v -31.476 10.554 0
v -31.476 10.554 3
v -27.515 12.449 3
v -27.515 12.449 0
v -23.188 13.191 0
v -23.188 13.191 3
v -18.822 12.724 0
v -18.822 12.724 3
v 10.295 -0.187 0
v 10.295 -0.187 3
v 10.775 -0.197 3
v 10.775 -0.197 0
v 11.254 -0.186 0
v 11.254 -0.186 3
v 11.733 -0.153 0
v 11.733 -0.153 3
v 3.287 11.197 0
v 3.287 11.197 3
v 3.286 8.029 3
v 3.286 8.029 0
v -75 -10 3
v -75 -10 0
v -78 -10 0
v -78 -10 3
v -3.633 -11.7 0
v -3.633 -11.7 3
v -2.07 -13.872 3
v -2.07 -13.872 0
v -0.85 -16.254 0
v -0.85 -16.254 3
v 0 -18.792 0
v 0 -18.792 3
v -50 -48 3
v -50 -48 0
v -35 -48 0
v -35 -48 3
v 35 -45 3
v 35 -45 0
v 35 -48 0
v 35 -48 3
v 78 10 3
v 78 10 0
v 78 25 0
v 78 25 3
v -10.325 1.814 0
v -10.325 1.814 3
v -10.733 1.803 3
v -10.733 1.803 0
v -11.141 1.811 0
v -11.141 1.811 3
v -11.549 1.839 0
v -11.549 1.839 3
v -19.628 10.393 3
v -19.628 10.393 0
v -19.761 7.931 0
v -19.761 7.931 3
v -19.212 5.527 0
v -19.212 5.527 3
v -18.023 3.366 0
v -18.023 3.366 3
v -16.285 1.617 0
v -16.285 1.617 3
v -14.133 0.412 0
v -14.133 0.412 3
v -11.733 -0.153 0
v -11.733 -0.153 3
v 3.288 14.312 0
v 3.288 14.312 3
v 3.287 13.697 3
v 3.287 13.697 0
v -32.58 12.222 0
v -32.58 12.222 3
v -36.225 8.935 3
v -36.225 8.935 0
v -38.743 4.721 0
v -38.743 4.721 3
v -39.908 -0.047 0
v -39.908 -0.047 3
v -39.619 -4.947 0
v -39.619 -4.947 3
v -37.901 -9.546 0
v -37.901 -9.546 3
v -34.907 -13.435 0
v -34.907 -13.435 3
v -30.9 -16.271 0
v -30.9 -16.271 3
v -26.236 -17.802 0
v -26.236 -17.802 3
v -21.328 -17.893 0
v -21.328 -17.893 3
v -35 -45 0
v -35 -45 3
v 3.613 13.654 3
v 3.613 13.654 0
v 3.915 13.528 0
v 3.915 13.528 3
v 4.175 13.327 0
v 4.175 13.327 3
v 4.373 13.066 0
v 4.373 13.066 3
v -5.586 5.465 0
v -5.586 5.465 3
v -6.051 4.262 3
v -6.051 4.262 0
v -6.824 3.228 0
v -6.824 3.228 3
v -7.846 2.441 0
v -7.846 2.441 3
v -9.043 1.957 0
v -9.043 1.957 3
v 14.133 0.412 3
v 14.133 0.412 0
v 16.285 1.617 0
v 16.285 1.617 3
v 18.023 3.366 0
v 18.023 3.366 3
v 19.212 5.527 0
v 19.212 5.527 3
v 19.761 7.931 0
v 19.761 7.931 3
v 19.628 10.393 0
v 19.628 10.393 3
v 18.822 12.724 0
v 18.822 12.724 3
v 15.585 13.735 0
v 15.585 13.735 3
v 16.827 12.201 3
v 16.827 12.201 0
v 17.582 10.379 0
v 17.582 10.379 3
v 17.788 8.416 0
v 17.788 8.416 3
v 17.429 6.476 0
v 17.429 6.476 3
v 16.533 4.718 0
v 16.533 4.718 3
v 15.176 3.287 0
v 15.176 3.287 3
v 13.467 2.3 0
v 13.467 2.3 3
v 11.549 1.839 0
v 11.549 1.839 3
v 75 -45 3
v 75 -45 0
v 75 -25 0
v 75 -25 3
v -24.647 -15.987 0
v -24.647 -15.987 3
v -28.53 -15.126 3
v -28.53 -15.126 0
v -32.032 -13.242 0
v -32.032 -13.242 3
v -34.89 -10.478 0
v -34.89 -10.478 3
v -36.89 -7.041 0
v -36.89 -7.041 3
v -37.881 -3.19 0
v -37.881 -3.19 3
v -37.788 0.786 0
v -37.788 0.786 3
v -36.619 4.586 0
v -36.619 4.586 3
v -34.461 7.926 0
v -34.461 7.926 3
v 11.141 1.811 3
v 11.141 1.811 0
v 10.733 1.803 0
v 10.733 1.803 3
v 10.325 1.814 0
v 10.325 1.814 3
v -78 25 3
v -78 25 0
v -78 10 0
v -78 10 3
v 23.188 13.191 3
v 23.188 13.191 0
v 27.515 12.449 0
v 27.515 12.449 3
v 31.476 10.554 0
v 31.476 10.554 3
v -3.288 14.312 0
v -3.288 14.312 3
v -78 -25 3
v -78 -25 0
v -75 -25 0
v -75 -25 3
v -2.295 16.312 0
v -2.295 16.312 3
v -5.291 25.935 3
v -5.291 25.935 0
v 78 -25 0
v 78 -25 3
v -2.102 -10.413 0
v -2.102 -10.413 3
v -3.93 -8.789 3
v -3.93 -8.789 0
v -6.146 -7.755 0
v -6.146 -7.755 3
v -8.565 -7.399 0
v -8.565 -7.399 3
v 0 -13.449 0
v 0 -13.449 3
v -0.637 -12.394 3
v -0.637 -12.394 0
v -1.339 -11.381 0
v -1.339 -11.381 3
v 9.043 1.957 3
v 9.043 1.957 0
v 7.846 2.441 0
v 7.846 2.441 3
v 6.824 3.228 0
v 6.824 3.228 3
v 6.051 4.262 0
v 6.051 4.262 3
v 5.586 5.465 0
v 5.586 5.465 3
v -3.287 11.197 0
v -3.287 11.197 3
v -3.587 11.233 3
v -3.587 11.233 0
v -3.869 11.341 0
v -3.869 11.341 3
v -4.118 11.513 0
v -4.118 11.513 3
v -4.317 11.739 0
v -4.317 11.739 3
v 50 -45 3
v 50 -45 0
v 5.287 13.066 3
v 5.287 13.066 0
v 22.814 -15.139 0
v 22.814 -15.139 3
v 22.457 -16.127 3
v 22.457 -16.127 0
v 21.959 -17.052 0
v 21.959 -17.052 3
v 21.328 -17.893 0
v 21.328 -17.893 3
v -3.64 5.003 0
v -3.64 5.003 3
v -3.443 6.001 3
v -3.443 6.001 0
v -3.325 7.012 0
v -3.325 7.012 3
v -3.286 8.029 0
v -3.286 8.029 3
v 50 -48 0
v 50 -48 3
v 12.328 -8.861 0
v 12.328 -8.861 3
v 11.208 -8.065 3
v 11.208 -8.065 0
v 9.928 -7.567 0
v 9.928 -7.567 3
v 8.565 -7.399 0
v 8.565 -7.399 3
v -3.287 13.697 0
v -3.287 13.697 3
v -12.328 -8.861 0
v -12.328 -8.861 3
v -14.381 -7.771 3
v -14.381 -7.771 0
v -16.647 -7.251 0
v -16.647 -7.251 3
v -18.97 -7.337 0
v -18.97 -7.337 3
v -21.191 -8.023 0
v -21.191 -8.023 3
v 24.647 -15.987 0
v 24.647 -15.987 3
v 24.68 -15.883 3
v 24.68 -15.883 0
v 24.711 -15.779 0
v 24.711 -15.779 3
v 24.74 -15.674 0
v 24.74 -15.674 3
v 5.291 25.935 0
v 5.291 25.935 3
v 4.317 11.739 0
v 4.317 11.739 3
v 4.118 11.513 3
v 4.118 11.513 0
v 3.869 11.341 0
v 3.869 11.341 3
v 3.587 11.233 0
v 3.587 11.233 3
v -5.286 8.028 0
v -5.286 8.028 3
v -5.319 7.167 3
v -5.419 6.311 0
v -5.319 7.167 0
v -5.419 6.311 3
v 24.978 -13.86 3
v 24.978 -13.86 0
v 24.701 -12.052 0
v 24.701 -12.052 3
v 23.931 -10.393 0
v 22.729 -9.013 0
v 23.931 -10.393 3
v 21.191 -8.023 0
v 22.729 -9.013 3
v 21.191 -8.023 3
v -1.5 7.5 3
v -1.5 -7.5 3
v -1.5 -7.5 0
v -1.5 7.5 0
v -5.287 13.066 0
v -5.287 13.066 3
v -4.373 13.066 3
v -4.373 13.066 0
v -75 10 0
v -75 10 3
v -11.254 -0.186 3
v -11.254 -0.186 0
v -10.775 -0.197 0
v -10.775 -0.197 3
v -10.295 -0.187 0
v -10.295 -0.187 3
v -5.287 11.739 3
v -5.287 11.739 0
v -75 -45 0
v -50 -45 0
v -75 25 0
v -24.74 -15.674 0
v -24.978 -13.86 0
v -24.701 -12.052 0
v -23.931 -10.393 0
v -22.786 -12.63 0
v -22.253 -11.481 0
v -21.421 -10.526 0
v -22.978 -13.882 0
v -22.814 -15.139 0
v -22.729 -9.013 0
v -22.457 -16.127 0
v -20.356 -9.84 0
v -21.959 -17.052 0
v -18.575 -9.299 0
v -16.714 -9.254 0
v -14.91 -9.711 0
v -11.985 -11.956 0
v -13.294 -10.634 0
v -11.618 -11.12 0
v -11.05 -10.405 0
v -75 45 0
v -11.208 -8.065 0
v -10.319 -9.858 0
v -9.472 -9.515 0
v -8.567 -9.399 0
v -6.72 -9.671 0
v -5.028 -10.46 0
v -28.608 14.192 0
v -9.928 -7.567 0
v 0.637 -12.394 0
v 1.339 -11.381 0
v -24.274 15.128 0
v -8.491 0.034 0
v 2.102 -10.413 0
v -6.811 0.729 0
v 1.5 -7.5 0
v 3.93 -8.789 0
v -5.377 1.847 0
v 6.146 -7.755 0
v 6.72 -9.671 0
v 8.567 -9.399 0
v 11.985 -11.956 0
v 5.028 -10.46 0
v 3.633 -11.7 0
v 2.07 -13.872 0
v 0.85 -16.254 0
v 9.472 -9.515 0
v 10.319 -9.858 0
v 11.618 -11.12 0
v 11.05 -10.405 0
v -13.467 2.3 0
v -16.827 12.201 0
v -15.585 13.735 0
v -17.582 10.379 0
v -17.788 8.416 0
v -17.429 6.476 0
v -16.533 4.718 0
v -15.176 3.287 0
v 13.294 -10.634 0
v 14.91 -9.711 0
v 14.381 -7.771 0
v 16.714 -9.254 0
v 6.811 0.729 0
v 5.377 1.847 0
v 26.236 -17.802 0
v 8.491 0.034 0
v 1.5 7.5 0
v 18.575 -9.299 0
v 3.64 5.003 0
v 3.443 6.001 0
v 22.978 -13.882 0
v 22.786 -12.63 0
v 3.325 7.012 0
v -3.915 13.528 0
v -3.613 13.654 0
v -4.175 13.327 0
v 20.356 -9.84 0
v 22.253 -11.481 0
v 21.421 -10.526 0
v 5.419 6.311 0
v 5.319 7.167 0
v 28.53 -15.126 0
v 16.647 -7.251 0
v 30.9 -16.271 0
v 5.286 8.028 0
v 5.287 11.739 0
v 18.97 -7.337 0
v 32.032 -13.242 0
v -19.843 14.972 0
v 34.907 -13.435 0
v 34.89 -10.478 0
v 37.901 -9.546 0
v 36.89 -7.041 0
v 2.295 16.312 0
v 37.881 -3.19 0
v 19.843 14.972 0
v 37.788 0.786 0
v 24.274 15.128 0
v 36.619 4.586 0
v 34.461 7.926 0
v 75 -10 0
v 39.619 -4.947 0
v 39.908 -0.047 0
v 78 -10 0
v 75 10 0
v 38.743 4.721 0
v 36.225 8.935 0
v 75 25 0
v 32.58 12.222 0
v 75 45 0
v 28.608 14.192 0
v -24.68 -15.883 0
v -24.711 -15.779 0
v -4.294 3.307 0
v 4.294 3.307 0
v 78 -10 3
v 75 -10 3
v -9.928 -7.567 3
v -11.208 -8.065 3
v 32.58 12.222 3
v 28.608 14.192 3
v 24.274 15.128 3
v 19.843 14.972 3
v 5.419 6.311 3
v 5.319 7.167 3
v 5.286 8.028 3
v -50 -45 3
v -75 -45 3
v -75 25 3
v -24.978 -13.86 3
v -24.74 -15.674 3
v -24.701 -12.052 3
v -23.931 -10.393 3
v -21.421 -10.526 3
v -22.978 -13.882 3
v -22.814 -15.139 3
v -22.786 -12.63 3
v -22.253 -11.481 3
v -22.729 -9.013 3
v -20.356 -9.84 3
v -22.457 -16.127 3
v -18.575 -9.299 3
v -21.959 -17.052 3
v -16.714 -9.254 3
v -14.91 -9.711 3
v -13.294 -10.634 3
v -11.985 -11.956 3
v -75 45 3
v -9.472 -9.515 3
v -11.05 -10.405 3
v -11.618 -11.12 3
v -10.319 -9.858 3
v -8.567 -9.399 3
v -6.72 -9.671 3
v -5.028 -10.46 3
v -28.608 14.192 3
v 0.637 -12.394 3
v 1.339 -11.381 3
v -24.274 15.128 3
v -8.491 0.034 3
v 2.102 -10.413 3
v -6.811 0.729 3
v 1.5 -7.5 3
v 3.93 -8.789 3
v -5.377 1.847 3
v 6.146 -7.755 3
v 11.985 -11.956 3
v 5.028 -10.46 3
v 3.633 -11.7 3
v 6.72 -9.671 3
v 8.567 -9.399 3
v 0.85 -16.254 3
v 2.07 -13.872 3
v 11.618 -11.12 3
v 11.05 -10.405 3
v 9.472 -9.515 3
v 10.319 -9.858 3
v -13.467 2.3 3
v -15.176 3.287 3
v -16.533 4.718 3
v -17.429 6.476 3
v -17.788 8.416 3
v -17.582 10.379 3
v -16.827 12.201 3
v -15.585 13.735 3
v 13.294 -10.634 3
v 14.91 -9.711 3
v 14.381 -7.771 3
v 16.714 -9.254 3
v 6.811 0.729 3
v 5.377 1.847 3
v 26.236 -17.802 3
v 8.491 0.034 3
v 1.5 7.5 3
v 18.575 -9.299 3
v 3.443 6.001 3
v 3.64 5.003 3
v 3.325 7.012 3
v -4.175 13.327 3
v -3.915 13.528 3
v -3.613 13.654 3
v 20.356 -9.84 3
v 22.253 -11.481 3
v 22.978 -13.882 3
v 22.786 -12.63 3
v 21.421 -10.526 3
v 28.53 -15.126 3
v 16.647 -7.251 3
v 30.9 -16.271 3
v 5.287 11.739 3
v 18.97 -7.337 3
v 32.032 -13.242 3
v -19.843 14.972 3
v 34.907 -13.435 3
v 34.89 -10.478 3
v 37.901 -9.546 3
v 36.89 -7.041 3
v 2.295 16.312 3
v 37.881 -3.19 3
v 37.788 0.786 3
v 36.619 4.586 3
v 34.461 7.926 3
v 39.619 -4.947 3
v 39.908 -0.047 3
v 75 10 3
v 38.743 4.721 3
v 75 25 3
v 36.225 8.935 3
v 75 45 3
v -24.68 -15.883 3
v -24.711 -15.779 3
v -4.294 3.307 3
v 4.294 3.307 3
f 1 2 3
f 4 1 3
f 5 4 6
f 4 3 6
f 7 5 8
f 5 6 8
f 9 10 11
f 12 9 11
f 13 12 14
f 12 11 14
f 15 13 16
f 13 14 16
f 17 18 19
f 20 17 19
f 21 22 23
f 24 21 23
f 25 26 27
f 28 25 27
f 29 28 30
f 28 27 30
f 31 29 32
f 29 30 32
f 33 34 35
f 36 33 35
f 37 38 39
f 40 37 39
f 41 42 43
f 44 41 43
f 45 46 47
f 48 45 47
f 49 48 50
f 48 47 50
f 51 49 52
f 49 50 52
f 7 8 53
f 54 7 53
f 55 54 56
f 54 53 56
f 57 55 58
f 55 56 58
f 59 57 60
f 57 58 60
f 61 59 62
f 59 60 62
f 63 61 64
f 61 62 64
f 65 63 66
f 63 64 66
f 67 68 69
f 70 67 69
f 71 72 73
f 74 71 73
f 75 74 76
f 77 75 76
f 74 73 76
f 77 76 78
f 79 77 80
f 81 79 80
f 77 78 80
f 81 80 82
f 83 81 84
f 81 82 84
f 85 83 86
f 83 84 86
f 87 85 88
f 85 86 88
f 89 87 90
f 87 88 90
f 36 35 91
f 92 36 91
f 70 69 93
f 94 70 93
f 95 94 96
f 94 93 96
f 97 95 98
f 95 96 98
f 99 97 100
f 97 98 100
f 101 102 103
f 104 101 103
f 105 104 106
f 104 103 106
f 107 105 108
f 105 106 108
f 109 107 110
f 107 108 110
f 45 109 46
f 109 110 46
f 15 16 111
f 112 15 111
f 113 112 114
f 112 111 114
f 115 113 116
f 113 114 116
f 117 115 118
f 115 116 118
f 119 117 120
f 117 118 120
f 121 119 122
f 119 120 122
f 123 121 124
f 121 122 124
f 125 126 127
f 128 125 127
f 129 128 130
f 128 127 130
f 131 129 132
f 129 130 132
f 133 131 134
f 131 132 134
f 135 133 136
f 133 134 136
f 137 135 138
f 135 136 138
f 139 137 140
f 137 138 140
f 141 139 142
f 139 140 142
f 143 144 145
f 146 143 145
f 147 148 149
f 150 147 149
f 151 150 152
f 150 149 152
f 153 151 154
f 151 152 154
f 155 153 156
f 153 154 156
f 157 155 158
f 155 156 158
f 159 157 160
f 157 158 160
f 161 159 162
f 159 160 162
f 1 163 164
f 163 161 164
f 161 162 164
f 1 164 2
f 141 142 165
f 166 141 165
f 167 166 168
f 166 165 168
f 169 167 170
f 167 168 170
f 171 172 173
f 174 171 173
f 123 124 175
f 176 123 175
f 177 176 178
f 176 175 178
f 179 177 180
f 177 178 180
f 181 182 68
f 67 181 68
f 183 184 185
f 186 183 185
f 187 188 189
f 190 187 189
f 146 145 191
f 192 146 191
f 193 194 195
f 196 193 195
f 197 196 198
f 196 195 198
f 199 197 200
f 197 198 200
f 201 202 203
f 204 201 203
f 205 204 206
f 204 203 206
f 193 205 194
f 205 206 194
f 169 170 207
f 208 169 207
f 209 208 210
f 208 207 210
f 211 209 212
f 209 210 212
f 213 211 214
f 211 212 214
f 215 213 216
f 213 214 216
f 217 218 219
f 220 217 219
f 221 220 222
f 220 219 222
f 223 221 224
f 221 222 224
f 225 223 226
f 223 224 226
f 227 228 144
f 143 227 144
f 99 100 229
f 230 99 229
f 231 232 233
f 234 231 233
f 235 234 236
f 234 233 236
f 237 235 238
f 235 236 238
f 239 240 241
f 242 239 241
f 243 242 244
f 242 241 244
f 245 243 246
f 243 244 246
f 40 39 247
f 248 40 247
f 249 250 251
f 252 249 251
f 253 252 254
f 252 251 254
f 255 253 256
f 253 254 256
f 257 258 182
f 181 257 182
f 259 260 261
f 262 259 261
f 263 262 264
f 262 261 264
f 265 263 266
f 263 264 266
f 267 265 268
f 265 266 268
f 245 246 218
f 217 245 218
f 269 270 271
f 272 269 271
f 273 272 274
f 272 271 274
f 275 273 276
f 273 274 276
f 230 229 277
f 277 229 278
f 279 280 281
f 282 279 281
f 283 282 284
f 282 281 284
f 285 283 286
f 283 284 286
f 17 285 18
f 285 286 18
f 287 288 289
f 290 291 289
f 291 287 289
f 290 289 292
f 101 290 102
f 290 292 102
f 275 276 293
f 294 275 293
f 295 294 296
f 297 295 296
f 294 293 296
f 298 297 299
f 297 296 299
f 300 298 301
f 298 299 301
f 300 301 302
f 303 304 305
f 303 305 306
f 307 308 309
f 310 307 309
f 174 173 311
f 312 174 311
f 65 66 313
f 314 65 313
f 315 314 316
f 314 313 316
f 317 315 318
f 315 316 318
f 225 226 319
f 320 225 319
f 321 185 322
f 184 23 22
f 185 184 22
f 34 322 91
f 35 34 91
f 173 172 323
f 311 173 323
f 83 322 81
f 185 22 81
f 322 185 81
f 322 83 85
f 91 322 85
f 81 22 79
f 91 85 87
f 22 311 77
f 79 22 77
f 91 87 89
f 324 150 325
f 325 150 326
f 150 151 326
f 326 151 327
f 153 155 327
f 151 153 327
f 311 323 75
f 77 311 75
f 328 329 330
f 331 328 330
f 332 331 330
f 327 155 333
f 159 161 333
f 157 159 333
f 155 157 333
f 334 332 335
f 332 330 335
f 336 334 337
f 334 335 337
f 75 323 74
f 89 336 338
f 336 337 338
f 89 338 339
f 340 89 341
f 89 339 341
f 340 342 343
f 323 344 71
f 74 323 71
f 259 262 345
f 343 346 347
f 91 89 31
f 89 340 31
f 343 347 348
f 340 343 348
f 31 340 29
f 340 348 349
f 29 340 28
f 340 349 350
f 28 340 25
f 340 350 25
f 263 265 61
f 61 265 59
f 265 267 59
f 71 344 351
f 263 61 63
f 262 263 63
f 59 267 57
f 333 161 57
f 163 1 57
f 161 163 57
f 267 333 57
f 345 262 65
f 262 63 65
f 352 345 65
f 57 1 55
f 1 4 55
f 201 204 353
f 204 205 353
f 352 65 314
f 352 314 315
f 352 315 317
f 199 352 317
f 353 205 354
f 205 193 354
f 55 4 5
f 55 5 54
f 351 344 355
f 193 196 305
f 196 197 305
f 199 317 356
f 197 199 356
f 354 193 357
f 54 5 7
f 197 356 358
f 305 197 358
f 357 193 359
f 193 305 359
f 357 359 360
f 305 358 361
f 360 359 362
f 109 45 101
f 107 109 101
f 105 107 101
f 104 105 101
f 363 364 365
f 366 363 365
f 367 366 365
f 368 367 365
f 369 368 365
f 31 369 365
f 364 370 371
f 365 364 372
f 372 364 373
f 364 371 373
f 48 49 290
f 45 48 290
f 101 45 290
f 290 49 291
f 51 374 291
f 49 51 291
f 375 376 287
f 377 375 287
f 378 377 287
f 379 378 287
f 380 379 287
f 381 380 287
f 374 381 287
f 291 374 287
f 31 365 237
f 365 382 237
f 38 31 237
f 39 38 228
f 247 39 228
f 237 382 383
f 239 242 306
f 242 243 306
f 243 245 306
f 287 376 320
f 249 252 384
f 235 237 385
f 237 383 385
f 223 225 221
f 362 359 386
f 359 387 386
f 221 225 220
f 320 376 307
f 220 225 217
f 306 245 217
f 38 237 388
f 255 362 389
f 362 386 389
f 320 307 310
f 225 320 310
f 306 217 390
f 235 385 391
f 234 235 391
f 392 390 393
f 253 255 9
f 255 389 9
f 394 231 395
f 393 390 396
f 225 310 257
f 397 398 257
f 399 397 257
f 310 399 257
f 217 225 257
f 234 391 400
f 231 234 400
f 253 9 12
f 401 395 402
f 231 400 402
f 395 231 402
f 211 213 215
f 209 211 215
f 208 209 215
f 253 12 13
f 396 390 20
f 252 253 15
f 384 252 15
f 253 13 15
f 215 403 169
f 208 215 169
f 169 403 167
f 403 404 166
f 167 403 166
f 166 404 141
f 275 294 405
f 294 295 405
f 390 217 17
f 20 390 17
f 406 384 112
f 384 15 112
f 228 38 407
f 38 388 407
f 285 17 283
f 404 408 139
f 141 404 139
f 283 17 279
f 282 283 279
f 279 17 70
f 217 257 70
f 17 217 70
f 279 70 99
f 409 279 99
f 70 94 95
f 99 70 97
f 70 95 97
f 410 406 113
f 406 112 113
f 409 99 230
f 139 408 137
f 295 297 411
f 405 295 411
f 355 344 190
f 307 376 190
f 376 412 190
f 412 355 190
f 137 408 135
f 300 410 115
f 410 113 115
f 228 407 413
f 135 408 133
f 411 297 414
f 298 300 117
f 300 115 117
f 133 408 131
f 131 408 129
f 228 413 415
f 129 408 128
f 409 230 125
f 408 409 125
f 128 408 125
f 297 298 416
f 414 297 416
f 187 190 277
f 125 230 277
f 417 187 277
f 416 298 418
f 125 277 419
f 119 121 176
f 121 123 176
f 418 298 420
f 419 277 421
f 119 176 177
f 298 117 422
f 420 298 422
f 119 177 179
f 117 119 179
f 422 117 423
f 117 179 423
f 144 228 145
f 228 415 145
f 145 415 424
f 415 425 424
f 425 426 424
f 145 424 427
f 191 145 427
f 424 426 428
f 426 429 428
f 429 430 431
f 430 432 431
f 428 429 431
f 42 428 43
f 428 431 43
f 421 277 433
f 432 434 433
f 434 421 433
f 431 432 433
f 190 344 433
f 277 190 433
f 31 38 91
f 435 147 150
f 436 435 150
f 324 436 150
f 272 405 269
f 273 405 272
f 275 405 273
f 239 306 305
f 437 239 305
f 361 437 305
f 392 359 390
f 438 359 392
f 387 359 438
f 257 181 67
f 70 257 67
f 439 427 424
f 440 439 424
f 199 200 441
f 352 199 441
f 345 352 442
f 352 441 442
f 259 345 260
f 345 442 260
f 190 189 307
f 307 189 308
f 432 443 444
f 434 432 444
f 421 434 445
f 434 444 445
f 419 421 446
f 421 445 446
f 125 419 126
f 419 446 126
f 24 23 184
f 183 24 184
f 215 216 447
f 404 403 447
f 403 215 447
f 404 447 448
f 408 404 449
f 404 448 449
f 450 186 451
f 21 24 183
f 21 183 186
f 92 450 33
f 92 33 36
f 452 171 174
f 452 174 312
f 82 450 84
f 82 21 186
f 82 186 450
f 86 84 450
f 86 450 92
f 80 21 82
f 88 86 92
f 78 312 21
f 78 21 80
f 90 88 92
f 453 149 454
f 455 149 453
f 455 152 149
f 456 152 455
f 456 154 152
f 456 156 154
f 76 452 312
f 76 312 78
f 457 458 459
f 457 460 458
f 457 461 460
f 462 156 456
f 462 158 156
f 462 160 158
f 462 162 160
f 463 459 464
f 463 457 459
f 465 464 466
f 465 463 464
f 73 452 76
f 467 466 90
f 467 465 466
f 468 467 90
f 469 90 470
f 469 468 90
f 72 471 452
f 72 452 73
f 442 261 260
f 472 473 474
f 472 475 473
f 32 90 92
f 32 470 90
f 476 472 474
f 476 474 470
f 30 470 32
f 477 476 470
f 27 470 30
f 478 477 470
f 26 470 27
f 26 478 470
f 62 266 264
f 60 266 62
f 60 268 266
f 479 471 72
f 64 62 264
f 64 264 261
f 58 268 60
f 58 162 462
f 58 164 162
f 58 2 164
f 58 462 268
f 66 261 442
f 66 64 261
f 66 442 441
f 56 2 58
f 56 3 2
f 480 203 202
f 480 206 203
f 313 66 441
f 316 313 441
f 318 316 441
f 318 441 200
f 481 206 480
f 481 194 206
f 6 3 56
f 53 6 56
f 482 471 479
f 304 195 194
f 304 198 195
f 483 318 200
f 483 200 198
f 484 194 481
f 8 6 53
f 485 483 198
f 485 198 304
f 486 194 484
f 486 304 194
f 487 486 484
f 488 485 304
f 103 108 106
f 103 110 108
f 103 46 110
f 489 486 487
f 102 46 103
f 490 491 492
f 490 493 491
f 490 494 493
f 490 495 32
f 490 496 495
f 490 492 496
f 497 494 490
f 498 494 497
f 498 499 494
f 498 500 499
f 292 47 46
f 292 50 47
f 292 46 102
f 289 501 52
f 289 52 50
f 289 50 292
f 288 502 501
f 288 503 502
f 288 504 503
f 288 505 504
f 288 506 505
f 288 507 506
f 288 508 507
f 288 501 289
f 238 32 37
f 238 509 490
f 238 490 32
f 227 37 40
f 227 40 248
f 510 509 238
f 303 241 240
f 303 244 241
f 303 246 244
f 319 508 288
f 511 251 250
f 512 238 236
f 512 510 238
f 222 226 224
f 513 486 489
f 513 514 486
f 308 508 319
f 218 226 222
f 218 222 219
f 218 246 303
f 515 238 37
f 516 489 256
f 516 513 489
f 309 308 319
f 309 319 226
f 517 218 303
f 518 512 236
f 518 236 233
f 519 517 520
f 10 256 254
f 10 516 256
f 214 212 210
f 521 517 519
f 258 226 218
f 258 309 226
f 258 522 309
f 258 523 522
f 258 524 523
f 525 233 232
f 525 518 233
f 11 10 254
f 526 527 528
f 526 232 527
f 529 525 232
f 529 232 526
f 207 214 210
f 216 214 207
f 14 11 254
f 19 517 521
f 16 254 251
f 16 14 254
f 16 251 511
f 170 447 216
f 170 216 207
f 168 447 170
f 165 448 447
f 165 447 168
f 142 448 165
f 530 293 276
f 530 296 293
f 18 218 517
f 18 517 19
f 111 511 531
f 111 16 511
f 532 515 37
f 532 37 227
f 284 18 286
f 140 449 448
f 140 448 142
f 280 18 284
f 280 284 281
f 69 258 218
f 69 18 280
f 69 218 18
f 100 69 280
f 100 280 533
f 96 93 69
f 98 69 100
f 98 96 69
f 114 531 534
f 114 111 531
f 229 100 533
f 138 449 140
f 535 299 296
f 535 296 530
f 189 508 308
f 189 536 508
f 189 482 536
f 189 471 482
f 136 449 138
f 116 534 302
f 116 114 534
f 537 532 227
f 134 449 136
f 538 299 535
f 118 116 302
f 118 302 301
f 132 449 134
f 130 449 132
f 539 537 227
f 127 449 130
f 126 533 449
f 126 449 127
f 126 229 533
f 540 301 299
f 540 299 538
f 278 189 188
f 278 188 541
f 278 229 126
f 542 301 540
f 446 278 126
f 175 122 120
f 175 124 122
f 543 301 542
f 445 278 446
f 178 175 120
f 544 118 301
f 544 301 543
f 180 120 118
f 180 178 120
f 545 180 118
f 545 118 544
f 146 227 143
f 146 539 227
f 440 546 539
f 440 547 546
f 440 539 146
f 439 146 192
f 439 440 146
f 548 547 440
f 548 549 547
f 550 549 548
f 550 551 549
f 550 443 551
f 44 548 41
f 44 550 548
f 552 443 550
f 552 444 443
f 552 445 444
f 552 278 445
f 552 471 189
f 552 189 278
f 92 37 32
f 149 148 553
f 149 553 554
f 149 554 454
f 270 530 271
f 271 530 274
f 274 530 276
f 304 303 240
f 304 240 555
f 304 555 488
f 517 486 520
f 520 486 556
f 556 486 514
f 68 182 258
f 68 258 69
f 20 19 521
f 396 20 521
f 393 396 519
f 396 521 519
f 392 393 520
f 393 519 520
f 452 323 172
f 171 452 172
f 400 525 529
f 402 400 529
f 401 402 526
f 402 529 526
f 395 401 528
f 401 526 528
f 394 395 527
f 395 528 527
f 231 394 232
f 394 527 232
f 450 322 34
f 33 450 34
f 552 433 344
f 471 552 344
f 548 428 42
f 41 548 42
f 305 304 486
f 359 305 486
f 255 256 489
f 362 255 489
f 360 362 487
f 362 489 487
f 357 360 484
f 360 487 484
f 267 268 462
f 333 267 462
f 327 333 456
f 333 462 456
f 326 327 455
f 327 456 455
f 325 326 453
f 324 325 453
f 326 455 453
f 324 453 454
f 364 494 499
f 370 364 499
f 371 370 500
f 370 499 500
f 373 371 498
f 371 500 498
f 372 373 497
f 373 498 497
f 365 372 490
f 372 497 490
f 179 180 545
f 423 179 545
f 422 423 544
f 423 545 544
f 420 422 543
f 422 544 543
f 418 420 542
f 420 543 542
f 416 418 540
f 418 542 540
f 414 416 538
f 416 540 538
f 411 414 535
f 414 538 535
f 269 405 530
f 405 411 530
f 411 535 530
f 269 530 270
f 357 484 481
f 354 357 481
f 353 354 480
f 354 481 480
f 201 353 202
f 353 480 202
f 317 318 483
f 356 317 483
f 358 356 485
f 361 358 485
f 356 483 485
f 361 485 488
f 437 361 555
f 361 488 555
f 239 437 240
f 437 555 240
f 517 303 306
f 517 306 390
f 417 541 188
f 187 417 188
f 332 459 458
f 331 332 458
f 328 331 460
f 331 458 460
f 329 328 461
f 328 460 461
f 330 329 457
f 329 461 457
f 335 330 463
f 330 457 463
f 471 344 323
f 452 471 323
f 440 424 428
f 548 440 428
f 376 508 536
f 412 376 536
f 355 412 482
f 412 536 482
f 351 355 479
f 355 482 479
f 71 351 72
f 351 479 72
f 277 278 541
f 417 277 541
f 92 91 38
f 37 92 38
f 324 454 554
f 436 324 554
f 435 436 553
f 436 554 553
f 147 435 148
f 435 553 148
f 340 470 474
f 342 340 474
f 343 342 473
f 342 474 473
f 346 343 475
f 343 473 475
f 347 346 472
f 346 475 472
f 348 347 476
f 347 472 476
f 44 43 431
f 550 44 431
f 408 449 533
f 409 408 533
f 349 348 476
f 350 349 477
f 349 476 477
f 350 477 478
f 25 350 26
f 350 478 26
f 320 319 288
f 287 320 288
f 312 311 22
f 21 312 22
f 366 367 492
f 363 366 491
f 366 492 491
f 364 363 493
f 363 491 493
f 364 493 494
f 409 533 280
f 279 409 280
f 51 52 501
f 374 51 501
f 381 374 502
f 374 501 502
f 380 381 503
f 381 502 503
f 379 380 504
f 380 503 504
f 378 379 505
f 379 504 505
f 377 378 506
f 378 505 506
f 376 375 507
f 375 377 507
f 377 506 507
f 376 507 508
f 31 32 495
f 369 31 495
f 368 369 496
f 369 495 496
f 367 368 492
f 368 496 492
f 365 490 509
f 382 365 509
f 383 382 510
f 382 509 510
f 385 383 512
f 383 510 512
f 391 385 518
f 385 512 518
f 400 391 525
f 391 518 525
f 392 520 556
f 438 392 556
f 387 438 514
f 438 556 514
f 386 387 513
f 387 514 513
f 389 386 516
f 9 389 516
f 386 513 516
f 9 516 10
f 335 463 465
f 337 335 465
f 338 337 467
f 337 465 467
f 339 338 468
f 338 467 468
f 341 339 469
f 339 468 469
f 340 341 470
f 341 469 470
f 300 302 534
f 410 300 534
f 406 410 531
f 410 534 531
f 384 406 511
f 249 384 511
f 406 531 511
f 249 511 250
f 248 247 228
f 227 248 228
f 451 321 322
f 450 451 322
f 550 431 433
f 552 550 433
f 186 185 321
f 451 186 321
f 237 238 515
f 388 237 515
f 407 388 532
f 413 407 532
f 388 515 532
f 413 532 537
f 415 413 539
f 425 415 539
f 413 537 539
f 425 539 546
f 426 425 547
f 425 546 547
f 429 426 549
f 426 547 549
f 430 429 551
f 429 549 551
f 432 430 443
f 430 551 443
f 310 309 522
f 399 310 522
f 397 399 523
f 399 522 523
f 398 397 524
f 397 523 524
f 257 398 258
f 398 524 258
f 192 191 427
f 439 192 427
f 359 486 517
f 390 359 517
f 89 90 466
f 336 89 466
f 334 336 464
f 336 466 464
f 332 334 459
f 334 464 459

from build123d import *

# Parameters (mm, degrees)
BOSS_EXTRUDE1_DEPTH = 3
SKETCH2_W           = 3
SKETCH2_H           = 15
CUT_EXTRUDE1_DEPTH  = 10
CUT_EXTRUDE5_DEPTH  = 10


with BuildPart() as part:
    # Sketch1 → Boss-Extrude1 (new body)
    with BuildSketch(Plane.XY):
        Polygon((75, 45), (-75, 45), (-75, 25), (-78, 25), (-78, 10), (-75, 10), (-75, -10), (-78, -10), (-78, -25), (-75, -25), (-75, -45), (-50, -45), (-50, -48), (-35, -48), (-35, -45), (35, -45), (35, -48), (50, -48), (50, -45), (75, -45), (75, -25), (78, -25), (78, -10), (75, -10), (75, 10), (78, 10), (78, 25), (75, 25), align=None)
    extrude(amount=BOSS_EXTRUDE1_DEPTH)

    # Sketch2 → Cut-Extrude1 (cut)
    with BuildSketch(Plane.XY.offset(3)):
        Rectangle(SKETCH2_W, SKETCH2_H)
    extrude(amount=-CUT_EXTRUDE1_DEPTH, mode=Mode.SUBTRACT)

    # Sketch6 → Cut-Extrude5 (cut)
    with BuildSketch(Plane.XY.offset(3)):
        with BuildLine():
            Line((5.290512726, 25.935056248), (2.295363862, 16.311934545))
            Line((2.295363862, 16.311934545), (-2.295363862, 16.311934545))
            Line((-2.295363862, 16.311934545), (-5.290512726, 25.935056248))
            Line((-5.290512726, 25.935056248), (-5.287204108, 13.065687756))
            Line((-5.287204108, 13.065687756), (-4.373165869, 13.065687756))
            ThreePointArc((-4.373165869, 13.065687756), (-3.915305203, 13.527588879), (-3.287366333, 13.696945937))
            Line((-3.287366333, 13.696945937), (-3.287524442, 14.311934545))
            Line((-3.287524442, 14.311934545), (3.287524442, 14.311934545))
            Line((3.287524442, 14.311934545), (3.287366333, 13.696945937))
            ThreePointArc((3.287366333, 13.696945937), (3.915305203, 13.527588879), (4.373165869, 13.065687756))
            Line((4.373165869, 13.065687756), (5.287204108, 13.065687756))
            Line((5.287204108, 13.065687756), (5.290512726, 25.935056248))
        make_face()
        with BuildLine():
            Line((5.285908962, 8.028025182), (5.2868631, 11.739287))
            Line((5.2868631, 11.739287), (4.317442352, 11.739287))
            ThreePointArc((4.317442352, 11.739287), (3.869108183, 11.340735142), (3.286723602, 11.19694602))
            Line((3.286723602, 11.19694602), (3.285909029, 8.028539367))
            ThreePointArc((3.285909029, 8.028539367), (3.374432245, 6.505542997), (3.639582158, 5.003194892))
            ThreePointArc((3.639582158, 5.003194892), (6.055992917, 1.239562801), (10.295107821, -0.186576152))
            ThreePointArc((10.295107821, -0.186576152), (11.01438813, -0.194494412), (11.732516685, -0.153042755))
            ThreePointArc((11.732516685, -0.153042755), (18.692972821, 4.404939535), (18.821664118, 12.723989405))
            ThreePointArc((18.821664118, 12.723989405), (25.37715821, 12.9694755), (31.476327164, 10.553920845))
            ThreePointArc((31.476327164, 10.553920845), (37.518458896, -5.149561028), (24.647485484, -15.98675357))
            ThreePointArc((24.647485484, -15.98675357), (24.695354215, -15.831004559), (24.740416096, -15.674420407))
            ThreePointArc((24.740416096, -15.674420407), (24.374260224, -11.19523634), (21.190905903, -8.022947688))
            ThreePointArc((21.190905903, -8.022947688), (16.646624705, -7.250909085), (12.327665086, -8.861226761))
            ThreePointArc((12.327665086, -8.861226761), (10.583620787, -7.776302438), (8.564637884, -7.398864573))
            ThreePointArc((8.564637884, -7.398864573), (5.000034739, -8.19121848), (2.10219111, -10.413092149))
            ThreePointArc((2.10219111, -10.413092149), (0.980226646, -11.88188736), (0, -13.448833229))
            ThreePointArc((0, -13.448833229), (-0.980226646, -11.88188736), (-2.10219111, -10.413092149))
            ThreePointArc((-2.10219111, -10.413092149), (-5.000034739, -8.19121848), (-8.564637884, -7.398864573))
            ThreePointArc((-8.564637884, -7.398864573), (-10.583620787, -7.776302438), (-12.327665086, -8.861226761))
            ThreePointArc((-12.327665086, -8.861226761), (-16.646624705, -7.250909085), (-21.190905903, -8.022947688))
            ThreePointArc((-21.190905903, -8.022947688), (-24.374260224, -11.19523634), (-24.740416096, -15.674420407))
            ThreePointArc((-24.740416096, -15.674420407), (-24.695354215, -15.831004559), (-24.647485484, -15.98675357))
            ThreePointArc((-24.647485484, -15.98675357), (-37.518458896, -5.149561028), (-31.476327164, 10.553920845))
            ThreePointArc((-31.476327164, 10.553920845), (-25.37715821, 12.9694755), (-18.821664118, 12.723989405))
            ThreePointArc((-18.821664118, 12.723989405), (-18.692972821, 4.404939535), (-11.732516685, -0.153042755))
            ThreePointArc((-11.732516685, -0.153042755), (-11.01438813, -0.194494412), (-10.295107821, -0.186576152))
            ThreePointArc((-10.295107821, -0.186576152), (-6.055992917, 1.239562801), (-3.639582158, 5.003194892))
            ThreePointArc((-3.639582158, 5.003194892), (-3.374432245, 6.505542997), (-3.285909029, 8.028539367))
            Line((-3.285909029, 8.028539367), (-3.286723602, 11.19694602))
            ThreePointArc((-3.286723602, 11.19694602), (-3.869108183, 11.340735142), (-4.317442352, 11.739287))
            Line((-4.317442352, 11.739287), (-5.2868631, 11.739287))
            Line((-5.2868631, 11.739287), (-5.285908962, 8.028025182))
            ThreePointArc((-5.285908962, 8.028025182), (-5.360904336, 6.737768387), (-5.585534863, 5.465004453))
            ThreePointArc((-5.585534863, 5.465004453), (-7.308177113, 2.799425217), (-10.325195997, 1.814333325))
            ThreePointArc((-10.325195997, 1.814333325), (-10.937431926, 1.804308669), (-11.548794517, 1.838500909))
            ThreePointArc((-11.548794517, 1.838500909), (-17.428845514, 6.476374098), (-15.585134149, 13.734858501))
            ThreePointArc((-15.585134149, 13.734858501), (-24.273750539, 15.128136766), (-32.579650708, 12.222056678))
            ThreePointArc((-32.579650708, 12.222056678), (-38.93241703, -7.310810177), (-21.328283314, -17.893106884))
            ThreePointArc((-21.328283314, -17.893106884), (-22.225314868, -16.599112533), (-22.8135279, -15.138601519))
            ThreePointArc((-22.8135279, -15.138601519), (-22.559974367, -12.036881652), (-20.355583301, -9.840153276))
            ThreePointArc((-20.355583301, -9.840153276), (-15.796843839, -9.421233335), (-11.984787413, -11.956154477))
            ThreePointArc((-11.984787413, -11.956154477), (-10.701852428, -10.107966912), (-8.56669627, -9.398863514))
            ThreePointArc((-8.56669627, -9.398863514), (-5.845441544, -10.003754641), (-3.633197893, -11.699955866))
            ThreePointArc((-3.633197893, -11.699955866), (-1.414932414, -15.040464669), (0, -18.7924864))
            ThreePointArc((0, -18.7924864), (1.414932414, -15.040464669), (3.633197893, -11.699955866))
            ThreePointArc((3.633197893, -11.699955866), (5.845441544, -10.003754641), (8.56669627, -9.398863514))
            ThreePointArc((8.56669627, -9.398863514), (10.701852428, -10.107966912), (11.984787413, -11.956154477))
            ThreePointArc((11.984787413, -11.956154477), (15.796843839, -9.421233335), (20.355583301, -9.840153276))
            ThreePointArc((20.355583301, -9.840153276), (22.559974367, -12.036881652), (22.8135279, -15.138601519))
            ThreePointArc((22.8135279, -15.138601519), (22.225314868, -16.599112533), (21.328283314, -17.893106884))
            ThreePointArc((21.328283314, -17.893106884), (38.93241703, -7.310810177), (32.579650708, 12.222056678))
            ThreePointArc((32.579650708, 12.222056678), (24.273750539, 15.128136766), (15.585134149, 13.734858501))
            ThreePointArc((15.585134149, 13.734858501), (17.428845514, 6.476374098), (11.548794517, 1.838500909))
            ThreePointArc((11.548794517, 1.838500909), (10.937431926, 1.804308669), (10.325195997, 1.814333325))
            ThreePointArc((10.325195997, 1.814333325), (7.308177113, 2.799425217), (5.585534863, 5.465004453))
            ThreePointArc((5.585534863, 5.465004453), (5.360904336, 6.737768387), (5.285908962, 8.028025182))
        make_face()
    extrude(amount=-CUT_EXTRUDE5_DEPTH, mode=Mode.SUBTRACT)


solid = part.part
